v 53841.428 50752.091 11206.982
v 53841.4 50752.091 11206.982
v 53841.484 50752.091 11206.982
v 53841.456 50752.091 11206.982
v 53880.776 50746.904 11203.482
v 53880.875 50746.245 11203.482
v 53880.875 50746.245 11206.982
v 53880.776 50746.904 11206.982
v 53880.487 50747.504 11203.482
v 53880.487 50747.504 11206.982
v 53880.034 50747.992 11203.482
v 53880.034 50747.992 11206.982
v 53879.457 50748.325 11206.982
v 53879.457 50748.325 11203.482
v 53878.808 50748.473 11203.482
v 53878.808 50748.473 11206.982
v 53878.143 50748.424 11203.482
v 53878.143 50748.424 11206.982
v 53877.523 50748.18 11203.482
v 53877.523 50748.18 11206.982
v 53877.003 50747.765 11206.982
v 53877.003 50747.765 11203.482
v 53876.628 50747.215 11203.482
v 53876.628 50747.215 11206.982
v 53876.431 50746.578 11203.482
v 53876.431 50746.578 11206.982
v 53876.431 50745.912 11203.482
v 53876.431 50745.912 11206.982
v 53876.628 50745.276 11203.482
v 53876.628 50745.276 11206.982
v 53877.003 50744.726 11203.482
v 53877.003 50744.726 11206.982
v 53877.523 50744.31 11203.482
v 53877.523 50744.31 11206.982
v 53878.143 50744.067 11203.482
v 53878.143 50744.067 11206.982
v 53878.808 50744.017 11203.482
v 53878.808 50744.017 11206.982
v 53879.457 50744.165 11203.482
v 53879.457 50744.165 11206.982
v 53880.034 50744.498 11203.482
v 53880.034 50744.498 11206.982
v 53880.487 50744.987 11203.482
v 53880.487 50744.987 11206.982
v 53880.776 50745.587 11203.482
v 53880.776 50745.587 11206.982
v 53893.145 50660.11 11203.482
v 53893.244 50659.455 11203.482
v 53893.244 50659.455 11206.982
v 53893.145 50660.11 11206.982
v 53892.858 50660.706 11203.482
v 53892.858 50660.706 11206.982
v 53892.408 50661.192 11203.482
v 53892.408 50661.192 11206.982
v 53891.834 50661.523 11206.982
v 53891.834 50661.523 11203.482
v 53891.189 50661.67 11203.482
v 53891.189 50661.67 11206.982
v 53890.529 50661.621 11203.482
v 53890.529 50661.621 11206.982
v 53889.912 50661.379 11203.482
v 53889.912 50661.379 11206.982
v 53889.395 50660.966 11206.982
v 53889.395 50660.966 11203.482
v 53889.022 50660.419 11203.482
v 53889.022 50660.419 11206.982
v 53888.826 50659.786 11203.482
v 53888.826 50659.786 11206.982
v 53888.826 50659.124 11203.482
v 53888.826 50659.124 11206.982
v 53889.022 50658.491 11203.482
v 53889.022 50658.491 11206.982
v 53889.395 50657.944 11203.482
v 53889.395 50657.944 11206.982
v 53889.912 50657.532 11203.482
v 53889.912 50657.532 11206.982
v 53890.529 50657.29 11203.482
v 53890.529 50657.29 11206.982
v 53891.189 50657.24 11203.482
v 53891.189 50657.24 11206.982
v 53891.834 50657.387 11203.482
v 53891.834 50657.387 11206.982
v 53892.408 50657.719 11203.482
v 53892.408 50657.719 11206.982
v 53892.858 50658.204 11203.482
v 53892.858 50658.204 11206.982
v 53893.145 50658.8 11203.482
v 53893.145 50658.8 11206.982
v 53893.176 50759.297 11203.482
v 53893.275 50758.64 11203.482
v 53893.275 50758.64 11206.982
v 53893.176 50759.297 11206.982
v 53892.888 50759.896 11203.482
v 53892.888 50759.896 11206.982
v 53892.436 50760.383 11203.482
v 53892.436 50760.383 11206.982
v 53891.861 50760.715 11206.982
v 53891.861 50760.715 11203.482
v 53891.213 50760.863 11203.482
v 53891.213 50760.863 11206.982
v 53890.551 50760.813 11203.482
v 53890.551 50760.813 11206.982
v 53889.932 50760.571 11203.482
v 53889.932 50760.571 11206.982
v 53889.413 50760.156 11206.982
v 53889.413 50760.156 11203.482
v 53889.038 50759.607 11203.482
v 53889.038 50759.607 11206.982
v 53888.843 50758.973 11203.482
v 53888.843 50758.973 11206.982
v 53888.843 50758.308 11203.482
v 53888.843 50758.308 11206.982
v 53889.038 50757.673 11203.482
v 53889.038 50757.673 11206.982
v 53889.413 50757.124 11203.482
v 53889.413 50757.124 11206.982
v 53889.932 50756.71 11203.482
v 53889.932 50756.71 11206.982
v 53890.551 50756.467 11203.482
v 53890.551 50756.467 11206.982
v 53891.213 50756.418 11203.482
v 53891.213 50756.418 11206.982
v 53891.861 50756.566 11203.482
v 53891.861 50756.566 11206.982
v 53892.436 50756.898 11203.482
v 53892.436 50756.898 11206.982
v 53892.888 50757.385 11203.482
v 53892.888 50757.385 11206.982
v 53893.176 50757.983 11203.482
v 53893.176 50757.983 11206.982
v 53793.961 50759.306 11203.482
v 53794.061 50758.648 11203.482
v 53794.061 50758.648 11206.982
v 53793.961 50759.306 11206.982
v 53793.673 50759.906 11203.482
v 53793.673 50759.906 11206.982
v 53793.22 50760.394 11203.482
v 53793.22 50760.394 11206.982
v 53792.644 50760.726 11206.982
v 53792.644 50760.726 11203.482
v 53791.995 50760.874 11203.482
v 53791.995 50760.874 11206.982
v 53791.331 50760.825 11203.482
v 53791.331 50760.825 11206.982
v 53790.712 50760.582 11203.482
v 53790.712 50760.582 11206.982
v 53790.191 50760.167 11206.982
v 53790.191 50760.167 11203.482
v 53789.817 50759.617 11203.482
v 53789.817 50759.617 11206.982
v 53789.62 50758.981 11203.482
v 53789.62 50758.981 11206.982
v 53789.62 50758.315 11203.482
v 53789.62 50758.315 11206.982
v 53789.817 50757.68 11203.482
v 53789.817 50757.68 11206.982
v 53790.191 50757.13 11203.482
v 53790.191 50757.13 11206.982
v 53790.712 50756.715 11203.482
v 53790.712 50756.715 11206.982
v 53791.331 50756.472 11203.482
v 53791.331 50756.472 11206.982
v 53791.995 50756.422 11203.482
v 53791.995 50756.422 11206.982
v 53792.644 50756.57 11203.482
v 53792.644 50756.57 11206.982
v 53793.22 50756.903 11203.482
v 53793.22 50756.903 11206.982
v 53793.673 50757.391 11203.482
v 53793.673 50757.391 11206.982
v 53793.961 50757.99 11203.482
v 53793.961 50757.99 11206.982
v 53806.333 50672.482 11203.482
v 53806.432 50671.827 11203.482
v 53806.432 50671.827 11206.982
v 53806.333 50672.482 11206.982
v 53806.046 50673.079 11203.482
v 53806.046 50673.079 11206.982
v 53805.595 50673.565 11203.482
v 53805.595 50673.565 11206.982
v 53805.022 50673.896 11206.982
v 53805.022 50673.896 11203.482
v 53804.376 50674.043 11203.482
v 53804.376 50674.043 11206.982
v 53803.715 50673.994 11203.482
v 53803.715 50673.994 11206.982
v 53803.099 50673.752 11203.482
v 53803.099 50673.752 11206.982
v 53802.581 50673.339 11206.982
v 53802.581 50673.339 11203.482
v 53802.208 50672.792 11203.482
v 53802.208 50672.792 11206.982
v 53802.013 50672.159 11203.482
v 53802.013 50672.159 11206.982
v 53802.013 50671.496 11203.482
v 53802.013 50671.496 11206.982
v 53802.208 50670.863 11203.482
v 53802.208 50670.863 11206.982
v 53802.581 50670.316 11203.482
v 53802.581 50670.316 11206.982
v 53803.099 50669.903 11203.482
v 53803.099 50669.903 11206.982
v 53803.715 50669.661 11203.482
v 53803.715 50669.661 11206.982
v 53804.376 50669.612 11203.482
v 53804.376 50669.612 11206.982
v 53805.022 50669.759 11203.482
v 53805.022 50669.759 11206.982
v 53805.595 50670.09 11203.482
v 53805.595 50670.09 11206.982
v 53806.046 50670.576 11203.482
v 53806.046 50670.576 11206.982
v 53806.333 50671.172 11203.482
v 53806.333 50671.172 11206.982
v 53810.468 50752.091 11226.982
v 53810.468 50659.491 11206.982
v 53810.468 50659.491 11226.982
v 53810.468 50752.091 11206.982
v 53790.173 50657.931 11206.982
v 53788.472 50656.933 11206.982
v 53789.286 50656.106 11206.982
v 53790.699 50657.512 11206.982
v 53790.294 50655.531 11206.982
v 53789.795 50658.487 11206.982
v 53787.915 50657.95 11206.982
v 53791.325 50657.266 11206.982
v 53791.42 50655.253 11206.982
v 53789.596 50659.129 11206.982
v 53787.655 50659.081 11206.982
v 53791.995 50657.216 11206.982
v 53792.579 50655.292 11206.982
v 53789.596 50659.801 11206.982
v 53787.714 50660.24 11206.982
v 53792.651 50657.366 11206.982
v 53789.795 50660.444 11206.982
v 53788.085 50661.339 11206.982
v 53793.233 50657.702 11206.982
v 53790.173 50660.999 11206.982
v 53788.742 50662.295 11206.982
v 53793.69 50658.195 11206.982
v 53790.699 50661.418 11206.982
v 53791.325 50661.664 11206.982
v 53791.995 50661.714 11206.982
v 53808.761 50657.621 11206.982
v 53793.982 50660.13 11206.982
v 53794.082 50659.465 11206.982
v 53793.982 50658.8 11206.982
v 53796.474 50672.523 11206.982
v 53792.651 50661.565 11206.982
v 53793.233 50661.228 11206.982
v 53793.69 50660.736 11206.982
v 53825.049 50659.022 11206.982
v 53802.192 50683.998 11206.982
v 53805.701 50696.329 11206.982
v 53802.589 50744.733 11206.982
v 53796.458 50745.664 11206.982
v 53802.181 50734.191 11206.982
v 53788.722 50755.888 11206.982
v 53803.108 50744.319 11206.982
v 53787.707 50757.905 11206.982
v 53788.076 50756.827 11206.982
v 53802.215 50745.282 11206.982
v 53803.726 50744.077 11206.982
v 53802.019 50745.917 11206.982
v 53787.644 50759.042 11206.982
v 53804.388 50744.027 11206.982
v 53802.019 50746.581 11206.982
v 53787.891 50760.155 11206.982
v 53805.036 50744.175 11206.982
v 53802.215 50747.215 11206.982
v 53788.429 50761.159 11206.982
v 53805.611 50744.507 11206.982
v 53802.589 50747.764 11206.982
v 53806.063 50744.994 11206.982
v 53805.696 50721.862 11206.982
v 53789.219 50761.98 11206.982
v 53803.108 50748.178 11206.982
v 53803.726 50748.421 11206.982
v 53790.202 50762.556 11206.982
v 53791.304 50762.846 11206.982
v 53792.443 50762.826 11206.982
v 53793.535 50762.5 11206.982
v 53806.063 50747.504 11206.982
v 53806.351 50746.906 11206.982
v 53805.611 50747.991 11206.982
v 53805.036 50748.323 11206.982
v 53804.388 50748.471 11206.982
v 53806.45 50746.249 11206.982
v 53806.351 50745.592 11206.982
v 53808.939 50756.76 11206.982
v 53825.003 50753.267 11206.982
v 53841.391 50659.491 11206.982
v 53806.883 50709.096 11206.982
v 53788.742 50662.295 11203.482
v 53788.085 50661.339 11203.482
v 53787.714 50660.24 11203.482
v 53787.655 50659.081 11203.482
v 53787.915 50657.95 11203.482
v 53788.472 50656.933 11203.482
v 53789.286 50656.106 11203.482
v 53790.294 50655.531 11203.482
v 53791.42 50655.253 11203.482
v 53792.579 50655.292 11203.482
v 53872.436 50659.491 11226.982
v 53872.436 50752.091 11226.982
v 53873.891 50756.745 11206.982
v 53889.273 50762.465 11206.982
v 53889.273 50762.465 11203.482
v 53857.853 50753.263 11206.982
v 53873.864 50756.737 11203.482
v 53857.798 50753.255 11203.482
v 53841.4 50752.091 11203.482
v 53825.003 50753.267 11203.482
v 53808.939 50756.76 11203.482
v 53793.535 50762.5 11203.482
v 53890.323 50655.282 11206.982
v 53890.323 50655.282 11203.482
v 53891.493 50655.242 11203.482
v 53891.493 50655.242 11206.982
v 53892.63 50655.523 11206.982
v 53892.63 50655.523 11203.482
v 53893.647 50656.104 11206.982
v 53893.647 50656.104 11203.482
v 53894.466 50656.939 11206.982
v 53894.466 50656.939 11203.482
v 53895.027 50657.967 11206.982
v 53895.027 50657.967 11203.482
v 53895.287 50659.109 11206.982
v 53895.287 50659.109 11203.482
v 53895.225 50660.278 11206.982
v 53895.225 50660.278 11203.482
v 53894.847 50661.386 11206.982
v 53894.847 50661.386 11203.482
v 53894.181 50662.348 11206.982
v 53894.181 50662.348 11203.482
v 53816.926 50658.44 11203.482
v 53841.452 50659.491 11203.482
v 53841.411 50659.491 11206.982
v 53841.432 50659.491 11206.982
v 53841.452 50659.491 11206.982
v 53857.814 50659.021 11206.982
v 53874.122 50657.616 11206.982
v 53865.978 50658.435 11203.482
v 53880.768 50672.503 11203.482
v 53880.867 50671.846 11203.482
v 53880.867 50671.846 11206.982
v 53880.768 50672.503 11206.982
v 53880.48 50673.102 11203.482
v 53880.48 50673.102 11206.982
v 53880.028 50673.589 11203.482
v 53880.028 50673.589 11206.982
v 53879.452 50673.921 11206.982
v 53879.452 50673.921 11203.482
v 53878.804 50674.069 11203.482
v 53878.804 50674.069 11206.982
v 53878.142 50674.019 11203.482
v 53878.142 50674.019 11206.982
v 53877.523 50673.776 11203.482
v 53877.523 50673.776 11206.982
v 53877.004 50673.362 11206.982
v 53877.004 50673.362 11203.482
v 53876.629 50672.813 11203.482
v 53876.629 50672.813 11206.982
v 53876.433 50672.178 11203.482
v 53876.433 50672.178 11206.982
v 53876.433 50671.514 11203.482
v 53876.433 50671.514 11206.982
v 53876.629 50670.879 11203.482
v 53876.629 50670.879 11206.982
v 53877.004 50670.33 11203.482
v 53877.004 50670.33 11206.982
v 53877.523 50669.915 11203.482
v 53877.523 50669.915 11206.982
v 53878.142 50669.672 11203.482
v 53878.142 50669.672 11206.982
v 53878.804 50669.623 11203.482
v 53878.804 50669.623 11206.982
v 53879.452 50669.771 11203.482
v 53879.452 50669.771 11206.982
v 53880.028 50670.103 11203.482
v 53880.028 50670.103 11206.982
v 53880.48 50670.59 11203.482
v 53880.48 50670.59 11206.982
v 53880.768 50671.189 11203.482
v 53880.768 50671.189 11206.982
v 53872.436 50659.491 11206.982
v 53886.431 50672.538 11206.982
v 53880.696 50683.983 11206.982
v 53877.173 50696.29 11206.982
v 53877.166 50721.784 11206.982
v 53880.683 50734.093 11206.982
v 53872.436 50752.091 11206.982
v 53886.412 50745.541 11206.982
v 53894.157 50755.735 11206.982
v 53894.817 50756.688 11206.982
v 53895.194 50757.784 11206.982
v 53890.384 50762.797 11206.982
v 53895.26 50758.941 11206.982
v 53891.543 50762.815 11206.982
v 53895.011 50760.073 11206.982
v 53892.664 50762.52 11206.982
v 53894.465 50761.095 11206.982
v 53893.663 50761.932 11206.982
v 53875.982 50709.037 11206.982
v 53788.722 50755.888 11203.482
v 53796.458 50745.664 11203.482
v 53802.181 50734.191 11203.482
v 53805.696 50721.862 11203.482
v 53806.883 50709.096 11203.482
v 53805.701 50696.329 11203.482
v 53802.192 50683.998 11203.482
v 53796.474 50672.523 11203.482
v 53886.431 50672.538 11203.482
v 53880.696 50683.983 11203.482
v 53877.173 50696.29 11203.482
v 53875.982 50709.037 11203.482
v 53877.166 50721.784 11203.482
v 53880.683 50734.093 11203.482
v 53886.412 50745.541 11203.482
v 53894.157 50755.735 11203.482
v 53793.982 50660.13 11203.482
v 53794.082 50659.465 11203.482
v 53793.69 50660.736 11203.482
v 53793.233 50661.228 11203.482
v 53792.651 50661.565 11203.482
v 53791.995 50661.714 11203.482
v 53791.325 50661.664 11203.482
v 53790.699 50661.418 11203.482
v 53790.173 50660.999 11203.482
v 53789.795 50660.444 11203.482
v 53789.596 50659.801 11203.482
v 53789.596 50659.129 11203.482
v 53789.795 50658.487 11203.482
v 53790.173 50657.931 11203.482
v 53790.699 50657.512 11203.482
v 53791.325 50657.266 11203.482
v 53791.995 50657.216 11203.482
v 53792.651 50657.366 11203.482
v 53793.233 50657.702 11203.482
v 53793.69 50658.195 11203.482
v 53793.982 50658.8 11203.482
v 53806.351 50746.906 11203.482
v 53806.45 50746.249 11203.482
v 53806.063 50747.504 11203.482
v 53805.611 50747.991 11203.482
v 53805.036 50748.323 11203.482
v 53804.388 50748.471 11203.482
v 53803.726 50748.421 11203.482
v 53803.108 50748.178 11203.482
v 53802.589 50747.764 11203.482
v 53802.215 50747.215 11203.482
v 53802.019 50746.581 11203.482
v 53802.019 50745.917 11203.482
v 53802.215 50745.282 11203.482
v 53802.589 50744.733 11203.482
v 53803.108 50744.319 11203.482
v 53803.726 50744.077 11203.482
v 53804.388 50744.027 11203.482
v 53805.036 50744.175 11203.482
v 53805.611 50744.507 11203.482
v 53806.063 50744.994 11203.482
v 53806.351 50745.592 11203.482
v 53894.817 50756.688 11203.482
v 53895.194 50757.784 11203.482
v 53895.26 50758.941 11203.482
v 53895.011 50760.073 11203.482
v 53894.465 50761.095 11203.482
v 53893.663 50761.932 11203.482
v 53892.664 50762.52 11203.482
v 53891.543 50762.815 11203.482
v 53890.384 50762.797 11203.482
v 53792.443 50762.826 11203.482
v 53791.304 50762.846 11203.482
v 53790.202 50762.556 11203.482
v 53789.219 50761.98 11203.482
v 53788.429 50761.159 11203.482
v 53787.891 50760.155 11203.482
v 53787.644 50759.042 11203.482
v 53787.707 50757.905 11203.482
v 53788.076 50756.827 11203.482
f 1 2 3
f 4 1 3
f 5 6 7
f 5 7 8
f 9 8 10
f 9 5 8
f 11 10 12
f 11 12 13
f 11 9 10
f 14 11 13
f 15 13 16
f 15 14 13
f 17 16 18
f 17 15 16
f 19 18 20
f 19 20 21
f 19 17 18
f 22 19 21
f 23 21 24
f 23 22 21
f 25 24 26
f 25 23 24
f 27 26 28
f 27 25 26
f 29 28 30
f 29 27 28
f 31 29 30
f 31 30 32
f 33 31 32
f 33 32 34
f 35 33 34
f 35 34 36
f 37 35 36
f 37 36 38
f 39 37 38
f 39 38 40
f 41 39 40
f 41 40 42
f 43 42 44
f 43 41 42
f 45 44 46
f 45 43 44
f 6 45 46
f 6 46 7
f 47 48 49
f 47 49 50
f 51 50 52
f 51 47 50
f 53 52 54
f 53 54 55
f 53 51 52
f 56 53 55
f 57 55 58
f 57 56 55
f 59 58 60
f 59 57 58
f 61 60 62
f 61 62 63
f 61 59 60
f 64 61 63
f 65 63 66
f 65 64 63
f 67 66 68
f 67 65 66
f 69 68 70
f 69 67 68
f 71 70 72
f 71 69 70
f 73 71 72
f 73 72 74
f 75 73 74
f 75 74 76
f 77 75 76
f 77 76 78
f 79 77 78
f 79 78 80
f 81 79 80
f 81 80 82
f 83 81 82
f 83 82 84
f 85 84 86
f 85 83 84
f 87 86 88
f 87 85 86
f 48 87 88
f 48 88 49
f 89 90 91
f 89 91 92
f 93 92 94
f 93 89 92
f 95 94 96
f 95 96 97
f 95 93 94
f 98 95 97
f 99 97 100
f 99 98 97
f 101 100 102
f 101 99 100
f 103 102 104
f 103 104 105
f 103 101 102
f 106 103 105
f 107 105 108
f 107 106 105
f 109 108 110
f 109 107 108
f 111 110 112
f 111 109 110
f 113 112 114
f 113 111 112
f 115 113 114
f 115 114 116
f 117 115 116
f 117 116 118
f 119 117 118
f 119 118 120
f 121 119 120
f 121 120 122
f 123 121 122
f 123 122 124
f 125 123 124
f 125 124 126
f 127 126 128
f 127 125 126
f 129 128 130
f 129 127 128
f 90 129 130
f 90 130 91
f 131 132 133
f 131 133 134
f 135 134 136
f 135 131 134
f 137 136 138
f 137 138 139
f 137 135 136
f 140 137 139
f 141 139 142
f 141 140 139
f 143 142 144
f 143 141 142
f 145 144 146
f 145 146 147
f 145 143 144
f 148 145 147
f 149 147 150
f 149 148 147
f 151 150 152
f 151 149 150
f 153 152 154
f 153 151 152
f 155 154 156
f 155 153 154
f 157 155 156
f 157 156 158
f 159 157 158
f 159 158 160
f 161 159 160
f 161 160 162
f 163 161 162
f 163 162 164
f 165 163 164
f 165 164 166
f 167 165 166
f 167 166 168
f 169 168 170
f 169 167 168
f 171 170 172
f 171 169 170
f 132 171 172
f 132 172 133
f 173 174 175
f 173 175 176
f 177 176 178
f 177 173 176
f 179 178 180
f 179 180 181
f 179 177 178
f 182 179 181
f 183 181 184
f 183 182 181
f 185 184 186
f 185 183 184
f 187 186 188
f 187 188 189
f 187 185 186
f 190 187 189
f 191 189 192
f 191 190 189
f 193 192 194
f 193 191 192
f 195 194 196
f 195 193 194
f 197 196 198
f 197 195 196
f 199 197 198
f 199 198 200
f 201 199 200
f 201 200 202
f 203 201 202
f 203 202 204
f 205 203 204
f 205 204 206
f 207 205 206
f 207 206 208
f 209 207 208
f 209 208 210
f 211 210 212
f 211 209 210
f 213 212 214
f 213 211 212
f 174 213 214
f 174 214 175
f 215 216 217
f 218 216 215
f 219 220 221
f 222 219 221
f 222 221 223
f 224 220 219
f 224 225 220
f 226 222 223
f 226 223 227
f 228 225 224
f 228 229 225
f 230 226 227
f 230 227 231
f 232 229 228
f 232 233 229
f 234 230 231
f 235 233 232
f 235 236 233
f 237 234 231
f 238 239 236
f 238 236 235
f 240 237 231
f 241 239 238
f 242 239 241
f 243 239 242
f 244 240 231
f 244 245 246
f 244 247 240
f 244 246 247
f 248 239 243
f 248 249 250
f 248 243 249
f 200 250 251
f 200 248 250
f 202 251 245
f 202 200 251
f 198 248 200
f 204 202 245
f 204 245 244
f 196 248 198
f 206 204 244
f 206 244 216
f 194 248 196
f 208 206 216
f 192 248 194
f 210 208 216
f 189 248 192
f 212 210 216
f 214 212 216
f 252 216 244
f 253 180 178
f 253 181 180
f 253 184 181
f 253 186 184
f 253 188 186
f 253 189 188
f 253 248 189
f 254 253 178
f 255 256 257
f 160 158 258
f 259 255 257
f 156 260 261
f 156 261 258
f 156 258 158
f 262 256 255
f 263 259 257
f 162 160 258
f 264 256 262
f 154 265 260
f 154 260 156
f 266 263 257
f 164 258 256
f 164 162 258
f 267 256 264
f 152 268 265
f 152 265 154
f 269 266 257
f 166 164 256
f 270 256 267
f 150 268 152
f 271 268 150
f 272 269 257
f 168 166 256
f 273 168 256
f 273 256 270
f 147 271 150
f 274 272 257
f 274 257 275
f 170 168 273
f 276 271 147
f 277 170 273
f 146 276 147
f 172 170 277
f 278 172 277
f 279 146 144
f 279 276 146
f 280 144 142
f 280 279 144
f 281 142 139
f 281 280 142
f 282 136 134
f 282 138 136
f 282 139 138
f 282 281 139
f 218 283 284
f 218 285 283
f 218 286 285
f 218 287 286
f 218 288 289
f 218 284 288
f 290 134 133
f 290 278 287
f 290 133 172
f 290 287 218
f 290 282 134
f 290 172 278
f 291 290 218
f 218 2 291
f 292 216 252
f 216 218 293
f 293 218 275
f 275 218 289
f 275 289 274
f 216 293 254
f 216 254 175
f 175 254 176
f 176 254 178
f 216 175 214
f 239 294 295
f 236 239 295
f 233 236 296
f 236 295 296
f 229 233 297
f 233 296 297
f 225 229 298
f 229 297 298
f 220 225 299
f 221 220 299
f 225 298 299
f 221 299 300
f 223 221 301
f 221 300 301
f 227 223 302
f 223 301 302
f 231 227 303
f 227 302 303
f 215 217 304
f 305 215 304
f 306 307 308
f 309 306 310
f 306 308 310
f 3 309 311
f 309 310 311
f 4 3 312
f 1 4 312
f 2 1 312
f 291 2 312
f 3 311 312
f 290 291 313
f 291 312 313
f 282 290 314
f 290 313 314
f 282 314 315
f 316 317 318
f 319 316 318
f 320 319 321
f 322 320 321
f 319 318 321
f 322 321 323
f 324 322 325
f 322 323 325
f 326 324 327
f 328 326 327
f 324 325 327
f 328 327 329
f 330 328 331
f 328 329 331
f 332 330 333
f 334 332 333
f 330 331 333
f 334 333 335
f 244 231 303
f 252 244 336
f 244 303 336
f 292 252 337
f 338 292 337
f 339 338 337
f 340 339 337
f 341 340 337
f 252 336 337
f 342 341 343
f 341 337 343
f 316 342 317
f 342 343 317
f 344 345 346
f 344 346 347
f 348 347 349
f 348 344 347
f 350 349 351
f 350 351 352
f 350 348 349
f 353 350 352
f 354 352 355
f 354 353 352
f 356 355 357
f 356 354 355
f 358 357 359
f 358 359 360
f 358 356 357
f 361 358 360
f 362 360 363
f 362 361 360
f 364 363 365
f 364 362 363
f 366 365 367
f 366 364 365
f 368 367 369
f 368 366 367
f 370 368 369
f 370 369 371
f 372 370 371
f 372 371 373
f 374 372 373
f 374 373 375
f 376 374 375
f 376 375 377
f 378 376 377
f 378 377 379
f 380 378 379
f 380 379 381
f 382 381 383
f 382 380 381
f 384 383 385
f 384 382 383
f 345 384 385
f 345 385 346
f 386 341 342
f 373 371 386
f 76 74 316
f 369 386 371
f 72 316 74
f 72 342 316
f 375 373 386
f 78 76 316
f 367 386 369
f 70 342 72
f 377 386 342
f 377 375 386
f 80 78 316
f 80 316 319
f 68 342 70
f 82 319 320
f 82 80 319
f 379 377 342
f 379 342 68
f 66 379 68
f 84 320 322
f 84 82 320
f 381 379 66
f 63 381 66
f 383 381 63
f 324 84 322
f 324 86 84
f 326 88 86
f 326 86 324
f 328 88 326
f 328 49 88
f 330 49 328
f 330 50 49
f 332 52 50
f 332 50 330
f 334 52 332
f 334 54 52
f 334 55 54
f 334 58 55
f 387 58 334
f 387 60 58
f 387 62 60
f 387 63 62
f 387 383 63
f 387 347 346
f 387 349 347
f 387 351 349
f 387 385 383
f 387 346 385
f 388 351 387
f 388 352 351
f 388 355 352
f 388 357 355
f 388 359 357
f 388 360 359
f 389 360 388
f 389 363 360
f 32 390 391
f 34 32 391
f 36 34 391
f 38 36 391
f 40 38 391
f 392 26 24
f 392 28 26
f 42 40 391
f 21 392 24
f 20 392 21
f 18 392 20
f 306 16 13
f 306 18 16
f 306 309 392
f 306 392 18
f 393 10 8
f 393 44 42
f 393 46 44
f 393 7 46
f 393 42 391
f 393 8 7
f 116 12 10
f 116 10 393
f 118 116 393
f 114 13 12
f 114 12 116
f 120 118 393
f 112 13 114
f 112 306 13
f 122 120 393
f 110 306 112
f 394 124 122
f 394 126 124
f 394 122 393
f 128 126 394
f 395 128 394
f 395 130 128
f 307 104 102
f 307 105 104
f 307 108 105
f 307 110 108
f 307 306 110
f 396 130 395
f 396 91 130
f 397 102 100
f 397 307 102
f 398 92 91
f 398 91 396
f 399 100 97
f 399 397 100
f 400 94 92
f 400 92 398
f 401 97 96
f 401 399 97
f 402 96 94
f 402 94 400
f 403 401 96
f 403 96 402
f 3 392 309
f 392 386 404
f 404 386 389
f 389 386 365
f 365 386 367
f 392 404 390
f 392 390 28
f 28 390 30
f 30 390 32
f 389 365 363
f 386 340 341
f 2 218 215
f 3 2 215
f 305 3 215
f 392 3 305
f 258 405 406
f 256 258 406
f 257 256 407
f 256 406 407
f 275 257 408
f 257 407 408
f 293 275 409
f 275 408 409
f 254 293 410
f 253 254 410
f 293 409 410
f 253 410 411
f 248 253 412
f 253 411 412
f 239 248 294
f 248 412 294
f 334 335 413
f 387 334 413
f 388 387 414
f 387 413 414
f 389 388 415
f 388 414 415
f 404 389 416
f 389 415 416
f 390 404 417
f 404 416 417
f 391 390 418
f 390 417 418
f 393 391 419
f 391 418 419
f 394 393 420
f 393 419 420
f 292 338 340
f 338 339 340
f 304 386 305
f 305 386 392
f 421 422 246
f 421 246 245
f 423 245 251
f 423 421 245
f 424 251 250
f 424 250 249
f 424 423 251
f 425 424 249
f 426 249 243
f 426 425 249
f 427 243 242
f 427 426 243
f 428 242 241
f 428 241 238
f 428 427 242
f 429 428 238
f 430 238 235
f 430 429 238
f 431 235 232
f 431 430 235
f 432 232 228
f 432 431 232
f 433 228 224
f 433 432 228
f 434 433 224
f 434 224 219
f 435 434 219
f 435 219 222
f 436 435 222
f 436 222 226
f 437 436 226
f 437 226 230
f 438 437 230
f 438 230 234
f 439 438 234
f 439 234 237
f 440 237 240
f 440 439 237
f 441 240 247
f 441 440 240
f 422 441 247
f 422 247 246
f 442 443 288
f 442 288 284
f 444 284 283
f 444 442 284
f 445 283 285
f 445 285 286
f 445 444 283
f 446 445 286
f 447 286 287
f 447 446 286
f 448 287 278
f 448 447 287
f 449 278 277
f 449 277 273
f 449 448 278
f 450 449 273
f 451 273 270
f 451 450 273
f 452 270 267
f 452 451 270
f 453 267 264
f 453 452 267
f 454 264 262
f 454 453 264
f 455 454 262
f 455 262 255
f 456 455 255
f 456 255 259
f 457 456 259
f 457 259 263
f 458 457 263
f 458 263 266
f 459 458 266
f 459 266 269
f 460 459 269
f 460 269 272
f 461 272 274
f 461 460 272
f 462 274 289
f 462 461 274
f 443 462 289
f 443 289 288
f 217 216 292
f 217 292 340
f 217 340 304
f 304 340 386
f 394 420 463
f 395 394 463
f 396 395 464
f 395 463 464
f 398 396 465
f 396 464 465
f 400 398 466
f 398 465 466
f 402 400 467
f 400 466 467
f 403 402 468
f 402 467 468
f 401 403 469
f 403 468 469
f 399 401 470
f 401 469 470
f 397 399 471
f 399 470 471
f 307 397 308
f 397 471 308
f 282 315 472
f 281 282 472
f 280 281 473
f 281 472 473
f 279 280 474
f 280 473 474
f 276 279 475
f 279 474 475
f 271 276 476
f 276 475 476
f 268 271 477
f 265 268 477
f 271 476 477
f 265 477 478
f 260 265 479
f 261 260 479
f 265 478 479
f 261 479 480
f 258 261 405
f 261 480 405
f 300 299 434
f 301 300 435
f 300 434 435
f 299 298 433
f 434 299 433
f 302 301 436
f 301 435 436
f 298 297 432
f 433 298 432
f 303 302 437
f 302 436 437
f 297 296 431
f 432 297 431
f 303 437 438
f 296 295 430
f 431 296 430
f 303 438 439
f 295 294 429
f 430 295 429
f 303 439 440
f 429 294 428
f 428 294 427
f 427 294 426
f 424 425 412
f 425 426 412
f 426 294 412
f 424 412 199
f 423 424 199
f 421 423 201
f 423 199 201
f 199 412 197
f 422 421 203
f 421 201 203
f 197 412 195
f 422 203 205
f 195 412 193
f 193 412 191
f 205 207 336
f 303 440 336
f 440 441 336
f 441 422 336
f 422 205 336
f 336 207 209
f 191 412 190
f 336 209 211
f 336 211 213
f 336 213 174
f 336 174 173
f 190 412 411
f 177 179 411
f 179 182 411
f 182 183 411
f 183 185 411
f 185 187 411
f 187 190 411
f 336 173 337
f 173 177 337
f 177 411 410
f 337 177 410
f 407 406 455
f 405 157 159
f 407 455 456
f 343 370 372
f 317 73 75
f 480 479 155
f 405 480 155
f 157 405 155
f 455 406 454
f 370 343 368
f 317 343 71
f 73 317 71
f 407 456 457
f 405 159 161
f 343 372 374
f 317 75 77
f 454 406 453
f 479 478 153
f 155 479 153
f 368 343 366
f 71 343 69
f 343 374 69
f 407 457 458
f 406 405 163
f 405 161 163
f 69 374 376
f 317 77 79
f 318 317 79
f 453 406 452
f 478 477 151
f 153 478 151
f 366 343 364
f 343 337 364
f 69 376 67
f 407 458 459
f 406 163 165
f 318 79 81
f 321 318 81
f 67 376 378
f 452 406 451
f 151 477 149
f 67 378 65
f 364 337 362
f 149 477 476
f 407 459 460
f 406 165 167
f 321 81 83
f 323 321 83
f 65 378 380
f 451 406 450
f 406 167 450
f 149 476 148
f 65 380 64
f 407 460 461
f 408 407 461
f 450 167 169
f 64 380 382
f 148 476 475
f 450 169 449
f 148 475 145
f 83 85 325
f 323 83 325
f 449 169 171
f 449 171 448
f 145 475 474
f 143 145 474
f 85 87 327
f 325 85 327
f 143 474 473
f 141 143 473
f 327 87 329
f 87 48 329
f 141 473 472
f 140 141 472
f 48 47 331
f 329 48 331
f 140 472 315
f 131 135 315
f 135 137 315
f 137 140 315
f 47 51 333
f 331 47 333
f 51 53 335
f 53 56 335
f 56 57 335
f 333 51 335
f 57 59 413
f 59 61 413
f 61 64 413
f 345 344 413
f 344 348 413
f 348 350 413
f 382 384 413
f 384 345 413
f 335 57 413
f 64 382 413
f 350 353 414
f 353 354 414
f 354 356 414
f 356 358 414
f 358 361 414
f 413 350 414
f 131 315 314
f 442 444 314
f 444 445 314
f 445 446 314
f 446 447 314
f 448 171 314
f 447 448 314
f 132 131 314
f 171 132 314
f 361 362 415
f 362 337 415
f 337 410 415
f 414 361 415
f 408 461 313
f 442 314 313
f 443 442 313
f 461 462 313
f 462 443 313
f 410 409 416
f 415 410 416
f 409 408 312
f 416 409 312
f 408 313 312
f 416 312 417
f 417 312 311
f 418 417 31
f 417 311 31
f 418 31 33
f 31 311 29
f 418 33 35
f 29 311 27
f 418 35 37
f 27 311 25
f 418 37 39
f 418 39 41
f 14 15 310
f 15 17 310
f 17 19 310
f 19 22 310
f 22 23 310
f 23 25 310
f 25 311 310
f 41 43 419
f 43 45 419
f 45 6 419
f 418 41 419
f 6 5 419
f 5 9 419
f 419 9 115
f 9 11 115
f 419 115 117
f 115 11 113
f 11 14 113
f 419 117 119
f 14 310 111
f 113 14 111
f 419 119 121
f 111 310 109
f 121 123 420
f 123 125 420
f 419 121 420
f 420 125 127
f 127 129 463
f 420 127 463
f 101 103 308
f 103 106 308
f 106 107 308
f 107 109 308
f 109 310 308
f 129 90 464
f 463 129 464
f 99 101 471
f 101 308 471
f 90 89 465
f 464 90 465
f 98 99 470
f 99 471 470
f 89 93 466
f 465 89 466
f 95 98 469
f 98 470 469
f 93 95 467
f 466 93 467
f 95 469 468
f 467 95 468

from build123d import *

# Parameters (mm, degrees)
SKETCH1_R           = 2228.848425932
SKETCH1_R_2         = 2232.515095695
SKETCH1_R_3         = 2255.383637046
SKETCH1_R_4         = 2221.194192251
SKETCH1_R_5         = 2229.264638927
SKETCH1_R_6         = 2222.153252204
SKETCH1_R_7         = 2227.962328558
SKETCH1_R_8         = 2234.328555728
BOSS_EXTRUDE1_DEPTH = 3500
SKETCH2_W           = 61968.445691345
SKETCH2_H           = 92600
BOSS_EXTRUDE2_DEPTH = 20000
SCALE1_SCALE        = 0.001


with BuildPart() as part:
    # Sketch1 → Boss-Extrude1 (new body)
    with BuildSketch(Plane.XY):
        with BuildLine():
            ThreePointArc((106545.079885482, 100518.436826227), (106853.327609477, 105879.024620733), (101661.548830659, 107248.824341048))
            ThreePointArc((101661.548830659, 107248.824341048), (53788.50438499, 96874.393209157), (5922.956321239, 107283.35638346))
            ThreePointArc((5922.956321239, 107283.35638346), (817.61837842, 105942.536812531), (1110.36774195, 100672.188584726))
            ThreePointArc((1110.36774195, 100672.188584726), (19271.211317967, 53879.37747984), (1130.518180486, 7078.750742777))
            ThreePointArc((1130.518180486, 7078.750742777), (546.608093922, 2206.067347313), (4967.687443421, 75.796977839))
            ThreePointArc((4967.687443421, 75.796977839), (53840.129347423, 4274.393209157), (102711.67644046, 65.394194326))
            ThreePointArc((102711.67644046, 65.394194326), (107170.596097397, 2217.573525566), (106569.543420865, 7132.100569023))
            ThreePointArc((106569.543420865, 7132.100569023), (88370.47645447, 53820.504464396), (106545.079885482, 100518.436826227))
        make_face()
        with Locations((103434.821241174, 103424.132598226)):
            Circle(SKETCH1_R, mode=Mode.SUBTRACT)
        with Locations((4216.199864712, 103431.93144758)):
            Circle(SKETCH1_R_2, mode=Mode.SUBTRACT)
        with Locations((4214.875121526, 4248.849141113)):
            Circle(SKETCH1_R_3, mode=Mode.SUBTRACT)
        with Locations((103411.028421454, 4238.866596861)):
            Circle(SKETCH1_R_4, mode=Mode.SUBTRACT)
        with Locations((91025.969819716, 16629.576138342)):
            Circle(SKETCH1_R_5, mode=Mode.SUBTRACT)
        with Locations((16598.170941579, 16611.164460881)):
            Circle(SKETCH1_R_6, mode=Mode.SUBTRACT)
        with Locations((16610.109502545, 91032.533832428)):
            Circle(SKETCH1_R_7, mode=Mode.SUBTRACT)
        with Locations((91028.833016767, 91029.045185522)):
            Circle(SKETCH1_R_8, mode=Mode.SUBTRACT)
    extrude(amount=BOSS_EXTRUDE1_DEPTH)

    # Sketch2 → Boss-Extrude2 (add)
    with BuildSketch(Plane.XY.offset(3500)):
        with Locations((53840.129347424, 50574.393209157)):
            Rectangle(SKETCH2_W, SKETCH2_H)
    extrude(amount=BOSS_EXTRUDE2_DEPTH)


with BuildPart() as part_1:
    # Scale1: scaled about (53841.453243905, 50705.922203797, 11214.696487876)
    add(part.part.scale(SCALE1_SCALE).moved(Location((53787.611790661, 50655.216281593, 11203.481791388))))


solid = part_1.part
